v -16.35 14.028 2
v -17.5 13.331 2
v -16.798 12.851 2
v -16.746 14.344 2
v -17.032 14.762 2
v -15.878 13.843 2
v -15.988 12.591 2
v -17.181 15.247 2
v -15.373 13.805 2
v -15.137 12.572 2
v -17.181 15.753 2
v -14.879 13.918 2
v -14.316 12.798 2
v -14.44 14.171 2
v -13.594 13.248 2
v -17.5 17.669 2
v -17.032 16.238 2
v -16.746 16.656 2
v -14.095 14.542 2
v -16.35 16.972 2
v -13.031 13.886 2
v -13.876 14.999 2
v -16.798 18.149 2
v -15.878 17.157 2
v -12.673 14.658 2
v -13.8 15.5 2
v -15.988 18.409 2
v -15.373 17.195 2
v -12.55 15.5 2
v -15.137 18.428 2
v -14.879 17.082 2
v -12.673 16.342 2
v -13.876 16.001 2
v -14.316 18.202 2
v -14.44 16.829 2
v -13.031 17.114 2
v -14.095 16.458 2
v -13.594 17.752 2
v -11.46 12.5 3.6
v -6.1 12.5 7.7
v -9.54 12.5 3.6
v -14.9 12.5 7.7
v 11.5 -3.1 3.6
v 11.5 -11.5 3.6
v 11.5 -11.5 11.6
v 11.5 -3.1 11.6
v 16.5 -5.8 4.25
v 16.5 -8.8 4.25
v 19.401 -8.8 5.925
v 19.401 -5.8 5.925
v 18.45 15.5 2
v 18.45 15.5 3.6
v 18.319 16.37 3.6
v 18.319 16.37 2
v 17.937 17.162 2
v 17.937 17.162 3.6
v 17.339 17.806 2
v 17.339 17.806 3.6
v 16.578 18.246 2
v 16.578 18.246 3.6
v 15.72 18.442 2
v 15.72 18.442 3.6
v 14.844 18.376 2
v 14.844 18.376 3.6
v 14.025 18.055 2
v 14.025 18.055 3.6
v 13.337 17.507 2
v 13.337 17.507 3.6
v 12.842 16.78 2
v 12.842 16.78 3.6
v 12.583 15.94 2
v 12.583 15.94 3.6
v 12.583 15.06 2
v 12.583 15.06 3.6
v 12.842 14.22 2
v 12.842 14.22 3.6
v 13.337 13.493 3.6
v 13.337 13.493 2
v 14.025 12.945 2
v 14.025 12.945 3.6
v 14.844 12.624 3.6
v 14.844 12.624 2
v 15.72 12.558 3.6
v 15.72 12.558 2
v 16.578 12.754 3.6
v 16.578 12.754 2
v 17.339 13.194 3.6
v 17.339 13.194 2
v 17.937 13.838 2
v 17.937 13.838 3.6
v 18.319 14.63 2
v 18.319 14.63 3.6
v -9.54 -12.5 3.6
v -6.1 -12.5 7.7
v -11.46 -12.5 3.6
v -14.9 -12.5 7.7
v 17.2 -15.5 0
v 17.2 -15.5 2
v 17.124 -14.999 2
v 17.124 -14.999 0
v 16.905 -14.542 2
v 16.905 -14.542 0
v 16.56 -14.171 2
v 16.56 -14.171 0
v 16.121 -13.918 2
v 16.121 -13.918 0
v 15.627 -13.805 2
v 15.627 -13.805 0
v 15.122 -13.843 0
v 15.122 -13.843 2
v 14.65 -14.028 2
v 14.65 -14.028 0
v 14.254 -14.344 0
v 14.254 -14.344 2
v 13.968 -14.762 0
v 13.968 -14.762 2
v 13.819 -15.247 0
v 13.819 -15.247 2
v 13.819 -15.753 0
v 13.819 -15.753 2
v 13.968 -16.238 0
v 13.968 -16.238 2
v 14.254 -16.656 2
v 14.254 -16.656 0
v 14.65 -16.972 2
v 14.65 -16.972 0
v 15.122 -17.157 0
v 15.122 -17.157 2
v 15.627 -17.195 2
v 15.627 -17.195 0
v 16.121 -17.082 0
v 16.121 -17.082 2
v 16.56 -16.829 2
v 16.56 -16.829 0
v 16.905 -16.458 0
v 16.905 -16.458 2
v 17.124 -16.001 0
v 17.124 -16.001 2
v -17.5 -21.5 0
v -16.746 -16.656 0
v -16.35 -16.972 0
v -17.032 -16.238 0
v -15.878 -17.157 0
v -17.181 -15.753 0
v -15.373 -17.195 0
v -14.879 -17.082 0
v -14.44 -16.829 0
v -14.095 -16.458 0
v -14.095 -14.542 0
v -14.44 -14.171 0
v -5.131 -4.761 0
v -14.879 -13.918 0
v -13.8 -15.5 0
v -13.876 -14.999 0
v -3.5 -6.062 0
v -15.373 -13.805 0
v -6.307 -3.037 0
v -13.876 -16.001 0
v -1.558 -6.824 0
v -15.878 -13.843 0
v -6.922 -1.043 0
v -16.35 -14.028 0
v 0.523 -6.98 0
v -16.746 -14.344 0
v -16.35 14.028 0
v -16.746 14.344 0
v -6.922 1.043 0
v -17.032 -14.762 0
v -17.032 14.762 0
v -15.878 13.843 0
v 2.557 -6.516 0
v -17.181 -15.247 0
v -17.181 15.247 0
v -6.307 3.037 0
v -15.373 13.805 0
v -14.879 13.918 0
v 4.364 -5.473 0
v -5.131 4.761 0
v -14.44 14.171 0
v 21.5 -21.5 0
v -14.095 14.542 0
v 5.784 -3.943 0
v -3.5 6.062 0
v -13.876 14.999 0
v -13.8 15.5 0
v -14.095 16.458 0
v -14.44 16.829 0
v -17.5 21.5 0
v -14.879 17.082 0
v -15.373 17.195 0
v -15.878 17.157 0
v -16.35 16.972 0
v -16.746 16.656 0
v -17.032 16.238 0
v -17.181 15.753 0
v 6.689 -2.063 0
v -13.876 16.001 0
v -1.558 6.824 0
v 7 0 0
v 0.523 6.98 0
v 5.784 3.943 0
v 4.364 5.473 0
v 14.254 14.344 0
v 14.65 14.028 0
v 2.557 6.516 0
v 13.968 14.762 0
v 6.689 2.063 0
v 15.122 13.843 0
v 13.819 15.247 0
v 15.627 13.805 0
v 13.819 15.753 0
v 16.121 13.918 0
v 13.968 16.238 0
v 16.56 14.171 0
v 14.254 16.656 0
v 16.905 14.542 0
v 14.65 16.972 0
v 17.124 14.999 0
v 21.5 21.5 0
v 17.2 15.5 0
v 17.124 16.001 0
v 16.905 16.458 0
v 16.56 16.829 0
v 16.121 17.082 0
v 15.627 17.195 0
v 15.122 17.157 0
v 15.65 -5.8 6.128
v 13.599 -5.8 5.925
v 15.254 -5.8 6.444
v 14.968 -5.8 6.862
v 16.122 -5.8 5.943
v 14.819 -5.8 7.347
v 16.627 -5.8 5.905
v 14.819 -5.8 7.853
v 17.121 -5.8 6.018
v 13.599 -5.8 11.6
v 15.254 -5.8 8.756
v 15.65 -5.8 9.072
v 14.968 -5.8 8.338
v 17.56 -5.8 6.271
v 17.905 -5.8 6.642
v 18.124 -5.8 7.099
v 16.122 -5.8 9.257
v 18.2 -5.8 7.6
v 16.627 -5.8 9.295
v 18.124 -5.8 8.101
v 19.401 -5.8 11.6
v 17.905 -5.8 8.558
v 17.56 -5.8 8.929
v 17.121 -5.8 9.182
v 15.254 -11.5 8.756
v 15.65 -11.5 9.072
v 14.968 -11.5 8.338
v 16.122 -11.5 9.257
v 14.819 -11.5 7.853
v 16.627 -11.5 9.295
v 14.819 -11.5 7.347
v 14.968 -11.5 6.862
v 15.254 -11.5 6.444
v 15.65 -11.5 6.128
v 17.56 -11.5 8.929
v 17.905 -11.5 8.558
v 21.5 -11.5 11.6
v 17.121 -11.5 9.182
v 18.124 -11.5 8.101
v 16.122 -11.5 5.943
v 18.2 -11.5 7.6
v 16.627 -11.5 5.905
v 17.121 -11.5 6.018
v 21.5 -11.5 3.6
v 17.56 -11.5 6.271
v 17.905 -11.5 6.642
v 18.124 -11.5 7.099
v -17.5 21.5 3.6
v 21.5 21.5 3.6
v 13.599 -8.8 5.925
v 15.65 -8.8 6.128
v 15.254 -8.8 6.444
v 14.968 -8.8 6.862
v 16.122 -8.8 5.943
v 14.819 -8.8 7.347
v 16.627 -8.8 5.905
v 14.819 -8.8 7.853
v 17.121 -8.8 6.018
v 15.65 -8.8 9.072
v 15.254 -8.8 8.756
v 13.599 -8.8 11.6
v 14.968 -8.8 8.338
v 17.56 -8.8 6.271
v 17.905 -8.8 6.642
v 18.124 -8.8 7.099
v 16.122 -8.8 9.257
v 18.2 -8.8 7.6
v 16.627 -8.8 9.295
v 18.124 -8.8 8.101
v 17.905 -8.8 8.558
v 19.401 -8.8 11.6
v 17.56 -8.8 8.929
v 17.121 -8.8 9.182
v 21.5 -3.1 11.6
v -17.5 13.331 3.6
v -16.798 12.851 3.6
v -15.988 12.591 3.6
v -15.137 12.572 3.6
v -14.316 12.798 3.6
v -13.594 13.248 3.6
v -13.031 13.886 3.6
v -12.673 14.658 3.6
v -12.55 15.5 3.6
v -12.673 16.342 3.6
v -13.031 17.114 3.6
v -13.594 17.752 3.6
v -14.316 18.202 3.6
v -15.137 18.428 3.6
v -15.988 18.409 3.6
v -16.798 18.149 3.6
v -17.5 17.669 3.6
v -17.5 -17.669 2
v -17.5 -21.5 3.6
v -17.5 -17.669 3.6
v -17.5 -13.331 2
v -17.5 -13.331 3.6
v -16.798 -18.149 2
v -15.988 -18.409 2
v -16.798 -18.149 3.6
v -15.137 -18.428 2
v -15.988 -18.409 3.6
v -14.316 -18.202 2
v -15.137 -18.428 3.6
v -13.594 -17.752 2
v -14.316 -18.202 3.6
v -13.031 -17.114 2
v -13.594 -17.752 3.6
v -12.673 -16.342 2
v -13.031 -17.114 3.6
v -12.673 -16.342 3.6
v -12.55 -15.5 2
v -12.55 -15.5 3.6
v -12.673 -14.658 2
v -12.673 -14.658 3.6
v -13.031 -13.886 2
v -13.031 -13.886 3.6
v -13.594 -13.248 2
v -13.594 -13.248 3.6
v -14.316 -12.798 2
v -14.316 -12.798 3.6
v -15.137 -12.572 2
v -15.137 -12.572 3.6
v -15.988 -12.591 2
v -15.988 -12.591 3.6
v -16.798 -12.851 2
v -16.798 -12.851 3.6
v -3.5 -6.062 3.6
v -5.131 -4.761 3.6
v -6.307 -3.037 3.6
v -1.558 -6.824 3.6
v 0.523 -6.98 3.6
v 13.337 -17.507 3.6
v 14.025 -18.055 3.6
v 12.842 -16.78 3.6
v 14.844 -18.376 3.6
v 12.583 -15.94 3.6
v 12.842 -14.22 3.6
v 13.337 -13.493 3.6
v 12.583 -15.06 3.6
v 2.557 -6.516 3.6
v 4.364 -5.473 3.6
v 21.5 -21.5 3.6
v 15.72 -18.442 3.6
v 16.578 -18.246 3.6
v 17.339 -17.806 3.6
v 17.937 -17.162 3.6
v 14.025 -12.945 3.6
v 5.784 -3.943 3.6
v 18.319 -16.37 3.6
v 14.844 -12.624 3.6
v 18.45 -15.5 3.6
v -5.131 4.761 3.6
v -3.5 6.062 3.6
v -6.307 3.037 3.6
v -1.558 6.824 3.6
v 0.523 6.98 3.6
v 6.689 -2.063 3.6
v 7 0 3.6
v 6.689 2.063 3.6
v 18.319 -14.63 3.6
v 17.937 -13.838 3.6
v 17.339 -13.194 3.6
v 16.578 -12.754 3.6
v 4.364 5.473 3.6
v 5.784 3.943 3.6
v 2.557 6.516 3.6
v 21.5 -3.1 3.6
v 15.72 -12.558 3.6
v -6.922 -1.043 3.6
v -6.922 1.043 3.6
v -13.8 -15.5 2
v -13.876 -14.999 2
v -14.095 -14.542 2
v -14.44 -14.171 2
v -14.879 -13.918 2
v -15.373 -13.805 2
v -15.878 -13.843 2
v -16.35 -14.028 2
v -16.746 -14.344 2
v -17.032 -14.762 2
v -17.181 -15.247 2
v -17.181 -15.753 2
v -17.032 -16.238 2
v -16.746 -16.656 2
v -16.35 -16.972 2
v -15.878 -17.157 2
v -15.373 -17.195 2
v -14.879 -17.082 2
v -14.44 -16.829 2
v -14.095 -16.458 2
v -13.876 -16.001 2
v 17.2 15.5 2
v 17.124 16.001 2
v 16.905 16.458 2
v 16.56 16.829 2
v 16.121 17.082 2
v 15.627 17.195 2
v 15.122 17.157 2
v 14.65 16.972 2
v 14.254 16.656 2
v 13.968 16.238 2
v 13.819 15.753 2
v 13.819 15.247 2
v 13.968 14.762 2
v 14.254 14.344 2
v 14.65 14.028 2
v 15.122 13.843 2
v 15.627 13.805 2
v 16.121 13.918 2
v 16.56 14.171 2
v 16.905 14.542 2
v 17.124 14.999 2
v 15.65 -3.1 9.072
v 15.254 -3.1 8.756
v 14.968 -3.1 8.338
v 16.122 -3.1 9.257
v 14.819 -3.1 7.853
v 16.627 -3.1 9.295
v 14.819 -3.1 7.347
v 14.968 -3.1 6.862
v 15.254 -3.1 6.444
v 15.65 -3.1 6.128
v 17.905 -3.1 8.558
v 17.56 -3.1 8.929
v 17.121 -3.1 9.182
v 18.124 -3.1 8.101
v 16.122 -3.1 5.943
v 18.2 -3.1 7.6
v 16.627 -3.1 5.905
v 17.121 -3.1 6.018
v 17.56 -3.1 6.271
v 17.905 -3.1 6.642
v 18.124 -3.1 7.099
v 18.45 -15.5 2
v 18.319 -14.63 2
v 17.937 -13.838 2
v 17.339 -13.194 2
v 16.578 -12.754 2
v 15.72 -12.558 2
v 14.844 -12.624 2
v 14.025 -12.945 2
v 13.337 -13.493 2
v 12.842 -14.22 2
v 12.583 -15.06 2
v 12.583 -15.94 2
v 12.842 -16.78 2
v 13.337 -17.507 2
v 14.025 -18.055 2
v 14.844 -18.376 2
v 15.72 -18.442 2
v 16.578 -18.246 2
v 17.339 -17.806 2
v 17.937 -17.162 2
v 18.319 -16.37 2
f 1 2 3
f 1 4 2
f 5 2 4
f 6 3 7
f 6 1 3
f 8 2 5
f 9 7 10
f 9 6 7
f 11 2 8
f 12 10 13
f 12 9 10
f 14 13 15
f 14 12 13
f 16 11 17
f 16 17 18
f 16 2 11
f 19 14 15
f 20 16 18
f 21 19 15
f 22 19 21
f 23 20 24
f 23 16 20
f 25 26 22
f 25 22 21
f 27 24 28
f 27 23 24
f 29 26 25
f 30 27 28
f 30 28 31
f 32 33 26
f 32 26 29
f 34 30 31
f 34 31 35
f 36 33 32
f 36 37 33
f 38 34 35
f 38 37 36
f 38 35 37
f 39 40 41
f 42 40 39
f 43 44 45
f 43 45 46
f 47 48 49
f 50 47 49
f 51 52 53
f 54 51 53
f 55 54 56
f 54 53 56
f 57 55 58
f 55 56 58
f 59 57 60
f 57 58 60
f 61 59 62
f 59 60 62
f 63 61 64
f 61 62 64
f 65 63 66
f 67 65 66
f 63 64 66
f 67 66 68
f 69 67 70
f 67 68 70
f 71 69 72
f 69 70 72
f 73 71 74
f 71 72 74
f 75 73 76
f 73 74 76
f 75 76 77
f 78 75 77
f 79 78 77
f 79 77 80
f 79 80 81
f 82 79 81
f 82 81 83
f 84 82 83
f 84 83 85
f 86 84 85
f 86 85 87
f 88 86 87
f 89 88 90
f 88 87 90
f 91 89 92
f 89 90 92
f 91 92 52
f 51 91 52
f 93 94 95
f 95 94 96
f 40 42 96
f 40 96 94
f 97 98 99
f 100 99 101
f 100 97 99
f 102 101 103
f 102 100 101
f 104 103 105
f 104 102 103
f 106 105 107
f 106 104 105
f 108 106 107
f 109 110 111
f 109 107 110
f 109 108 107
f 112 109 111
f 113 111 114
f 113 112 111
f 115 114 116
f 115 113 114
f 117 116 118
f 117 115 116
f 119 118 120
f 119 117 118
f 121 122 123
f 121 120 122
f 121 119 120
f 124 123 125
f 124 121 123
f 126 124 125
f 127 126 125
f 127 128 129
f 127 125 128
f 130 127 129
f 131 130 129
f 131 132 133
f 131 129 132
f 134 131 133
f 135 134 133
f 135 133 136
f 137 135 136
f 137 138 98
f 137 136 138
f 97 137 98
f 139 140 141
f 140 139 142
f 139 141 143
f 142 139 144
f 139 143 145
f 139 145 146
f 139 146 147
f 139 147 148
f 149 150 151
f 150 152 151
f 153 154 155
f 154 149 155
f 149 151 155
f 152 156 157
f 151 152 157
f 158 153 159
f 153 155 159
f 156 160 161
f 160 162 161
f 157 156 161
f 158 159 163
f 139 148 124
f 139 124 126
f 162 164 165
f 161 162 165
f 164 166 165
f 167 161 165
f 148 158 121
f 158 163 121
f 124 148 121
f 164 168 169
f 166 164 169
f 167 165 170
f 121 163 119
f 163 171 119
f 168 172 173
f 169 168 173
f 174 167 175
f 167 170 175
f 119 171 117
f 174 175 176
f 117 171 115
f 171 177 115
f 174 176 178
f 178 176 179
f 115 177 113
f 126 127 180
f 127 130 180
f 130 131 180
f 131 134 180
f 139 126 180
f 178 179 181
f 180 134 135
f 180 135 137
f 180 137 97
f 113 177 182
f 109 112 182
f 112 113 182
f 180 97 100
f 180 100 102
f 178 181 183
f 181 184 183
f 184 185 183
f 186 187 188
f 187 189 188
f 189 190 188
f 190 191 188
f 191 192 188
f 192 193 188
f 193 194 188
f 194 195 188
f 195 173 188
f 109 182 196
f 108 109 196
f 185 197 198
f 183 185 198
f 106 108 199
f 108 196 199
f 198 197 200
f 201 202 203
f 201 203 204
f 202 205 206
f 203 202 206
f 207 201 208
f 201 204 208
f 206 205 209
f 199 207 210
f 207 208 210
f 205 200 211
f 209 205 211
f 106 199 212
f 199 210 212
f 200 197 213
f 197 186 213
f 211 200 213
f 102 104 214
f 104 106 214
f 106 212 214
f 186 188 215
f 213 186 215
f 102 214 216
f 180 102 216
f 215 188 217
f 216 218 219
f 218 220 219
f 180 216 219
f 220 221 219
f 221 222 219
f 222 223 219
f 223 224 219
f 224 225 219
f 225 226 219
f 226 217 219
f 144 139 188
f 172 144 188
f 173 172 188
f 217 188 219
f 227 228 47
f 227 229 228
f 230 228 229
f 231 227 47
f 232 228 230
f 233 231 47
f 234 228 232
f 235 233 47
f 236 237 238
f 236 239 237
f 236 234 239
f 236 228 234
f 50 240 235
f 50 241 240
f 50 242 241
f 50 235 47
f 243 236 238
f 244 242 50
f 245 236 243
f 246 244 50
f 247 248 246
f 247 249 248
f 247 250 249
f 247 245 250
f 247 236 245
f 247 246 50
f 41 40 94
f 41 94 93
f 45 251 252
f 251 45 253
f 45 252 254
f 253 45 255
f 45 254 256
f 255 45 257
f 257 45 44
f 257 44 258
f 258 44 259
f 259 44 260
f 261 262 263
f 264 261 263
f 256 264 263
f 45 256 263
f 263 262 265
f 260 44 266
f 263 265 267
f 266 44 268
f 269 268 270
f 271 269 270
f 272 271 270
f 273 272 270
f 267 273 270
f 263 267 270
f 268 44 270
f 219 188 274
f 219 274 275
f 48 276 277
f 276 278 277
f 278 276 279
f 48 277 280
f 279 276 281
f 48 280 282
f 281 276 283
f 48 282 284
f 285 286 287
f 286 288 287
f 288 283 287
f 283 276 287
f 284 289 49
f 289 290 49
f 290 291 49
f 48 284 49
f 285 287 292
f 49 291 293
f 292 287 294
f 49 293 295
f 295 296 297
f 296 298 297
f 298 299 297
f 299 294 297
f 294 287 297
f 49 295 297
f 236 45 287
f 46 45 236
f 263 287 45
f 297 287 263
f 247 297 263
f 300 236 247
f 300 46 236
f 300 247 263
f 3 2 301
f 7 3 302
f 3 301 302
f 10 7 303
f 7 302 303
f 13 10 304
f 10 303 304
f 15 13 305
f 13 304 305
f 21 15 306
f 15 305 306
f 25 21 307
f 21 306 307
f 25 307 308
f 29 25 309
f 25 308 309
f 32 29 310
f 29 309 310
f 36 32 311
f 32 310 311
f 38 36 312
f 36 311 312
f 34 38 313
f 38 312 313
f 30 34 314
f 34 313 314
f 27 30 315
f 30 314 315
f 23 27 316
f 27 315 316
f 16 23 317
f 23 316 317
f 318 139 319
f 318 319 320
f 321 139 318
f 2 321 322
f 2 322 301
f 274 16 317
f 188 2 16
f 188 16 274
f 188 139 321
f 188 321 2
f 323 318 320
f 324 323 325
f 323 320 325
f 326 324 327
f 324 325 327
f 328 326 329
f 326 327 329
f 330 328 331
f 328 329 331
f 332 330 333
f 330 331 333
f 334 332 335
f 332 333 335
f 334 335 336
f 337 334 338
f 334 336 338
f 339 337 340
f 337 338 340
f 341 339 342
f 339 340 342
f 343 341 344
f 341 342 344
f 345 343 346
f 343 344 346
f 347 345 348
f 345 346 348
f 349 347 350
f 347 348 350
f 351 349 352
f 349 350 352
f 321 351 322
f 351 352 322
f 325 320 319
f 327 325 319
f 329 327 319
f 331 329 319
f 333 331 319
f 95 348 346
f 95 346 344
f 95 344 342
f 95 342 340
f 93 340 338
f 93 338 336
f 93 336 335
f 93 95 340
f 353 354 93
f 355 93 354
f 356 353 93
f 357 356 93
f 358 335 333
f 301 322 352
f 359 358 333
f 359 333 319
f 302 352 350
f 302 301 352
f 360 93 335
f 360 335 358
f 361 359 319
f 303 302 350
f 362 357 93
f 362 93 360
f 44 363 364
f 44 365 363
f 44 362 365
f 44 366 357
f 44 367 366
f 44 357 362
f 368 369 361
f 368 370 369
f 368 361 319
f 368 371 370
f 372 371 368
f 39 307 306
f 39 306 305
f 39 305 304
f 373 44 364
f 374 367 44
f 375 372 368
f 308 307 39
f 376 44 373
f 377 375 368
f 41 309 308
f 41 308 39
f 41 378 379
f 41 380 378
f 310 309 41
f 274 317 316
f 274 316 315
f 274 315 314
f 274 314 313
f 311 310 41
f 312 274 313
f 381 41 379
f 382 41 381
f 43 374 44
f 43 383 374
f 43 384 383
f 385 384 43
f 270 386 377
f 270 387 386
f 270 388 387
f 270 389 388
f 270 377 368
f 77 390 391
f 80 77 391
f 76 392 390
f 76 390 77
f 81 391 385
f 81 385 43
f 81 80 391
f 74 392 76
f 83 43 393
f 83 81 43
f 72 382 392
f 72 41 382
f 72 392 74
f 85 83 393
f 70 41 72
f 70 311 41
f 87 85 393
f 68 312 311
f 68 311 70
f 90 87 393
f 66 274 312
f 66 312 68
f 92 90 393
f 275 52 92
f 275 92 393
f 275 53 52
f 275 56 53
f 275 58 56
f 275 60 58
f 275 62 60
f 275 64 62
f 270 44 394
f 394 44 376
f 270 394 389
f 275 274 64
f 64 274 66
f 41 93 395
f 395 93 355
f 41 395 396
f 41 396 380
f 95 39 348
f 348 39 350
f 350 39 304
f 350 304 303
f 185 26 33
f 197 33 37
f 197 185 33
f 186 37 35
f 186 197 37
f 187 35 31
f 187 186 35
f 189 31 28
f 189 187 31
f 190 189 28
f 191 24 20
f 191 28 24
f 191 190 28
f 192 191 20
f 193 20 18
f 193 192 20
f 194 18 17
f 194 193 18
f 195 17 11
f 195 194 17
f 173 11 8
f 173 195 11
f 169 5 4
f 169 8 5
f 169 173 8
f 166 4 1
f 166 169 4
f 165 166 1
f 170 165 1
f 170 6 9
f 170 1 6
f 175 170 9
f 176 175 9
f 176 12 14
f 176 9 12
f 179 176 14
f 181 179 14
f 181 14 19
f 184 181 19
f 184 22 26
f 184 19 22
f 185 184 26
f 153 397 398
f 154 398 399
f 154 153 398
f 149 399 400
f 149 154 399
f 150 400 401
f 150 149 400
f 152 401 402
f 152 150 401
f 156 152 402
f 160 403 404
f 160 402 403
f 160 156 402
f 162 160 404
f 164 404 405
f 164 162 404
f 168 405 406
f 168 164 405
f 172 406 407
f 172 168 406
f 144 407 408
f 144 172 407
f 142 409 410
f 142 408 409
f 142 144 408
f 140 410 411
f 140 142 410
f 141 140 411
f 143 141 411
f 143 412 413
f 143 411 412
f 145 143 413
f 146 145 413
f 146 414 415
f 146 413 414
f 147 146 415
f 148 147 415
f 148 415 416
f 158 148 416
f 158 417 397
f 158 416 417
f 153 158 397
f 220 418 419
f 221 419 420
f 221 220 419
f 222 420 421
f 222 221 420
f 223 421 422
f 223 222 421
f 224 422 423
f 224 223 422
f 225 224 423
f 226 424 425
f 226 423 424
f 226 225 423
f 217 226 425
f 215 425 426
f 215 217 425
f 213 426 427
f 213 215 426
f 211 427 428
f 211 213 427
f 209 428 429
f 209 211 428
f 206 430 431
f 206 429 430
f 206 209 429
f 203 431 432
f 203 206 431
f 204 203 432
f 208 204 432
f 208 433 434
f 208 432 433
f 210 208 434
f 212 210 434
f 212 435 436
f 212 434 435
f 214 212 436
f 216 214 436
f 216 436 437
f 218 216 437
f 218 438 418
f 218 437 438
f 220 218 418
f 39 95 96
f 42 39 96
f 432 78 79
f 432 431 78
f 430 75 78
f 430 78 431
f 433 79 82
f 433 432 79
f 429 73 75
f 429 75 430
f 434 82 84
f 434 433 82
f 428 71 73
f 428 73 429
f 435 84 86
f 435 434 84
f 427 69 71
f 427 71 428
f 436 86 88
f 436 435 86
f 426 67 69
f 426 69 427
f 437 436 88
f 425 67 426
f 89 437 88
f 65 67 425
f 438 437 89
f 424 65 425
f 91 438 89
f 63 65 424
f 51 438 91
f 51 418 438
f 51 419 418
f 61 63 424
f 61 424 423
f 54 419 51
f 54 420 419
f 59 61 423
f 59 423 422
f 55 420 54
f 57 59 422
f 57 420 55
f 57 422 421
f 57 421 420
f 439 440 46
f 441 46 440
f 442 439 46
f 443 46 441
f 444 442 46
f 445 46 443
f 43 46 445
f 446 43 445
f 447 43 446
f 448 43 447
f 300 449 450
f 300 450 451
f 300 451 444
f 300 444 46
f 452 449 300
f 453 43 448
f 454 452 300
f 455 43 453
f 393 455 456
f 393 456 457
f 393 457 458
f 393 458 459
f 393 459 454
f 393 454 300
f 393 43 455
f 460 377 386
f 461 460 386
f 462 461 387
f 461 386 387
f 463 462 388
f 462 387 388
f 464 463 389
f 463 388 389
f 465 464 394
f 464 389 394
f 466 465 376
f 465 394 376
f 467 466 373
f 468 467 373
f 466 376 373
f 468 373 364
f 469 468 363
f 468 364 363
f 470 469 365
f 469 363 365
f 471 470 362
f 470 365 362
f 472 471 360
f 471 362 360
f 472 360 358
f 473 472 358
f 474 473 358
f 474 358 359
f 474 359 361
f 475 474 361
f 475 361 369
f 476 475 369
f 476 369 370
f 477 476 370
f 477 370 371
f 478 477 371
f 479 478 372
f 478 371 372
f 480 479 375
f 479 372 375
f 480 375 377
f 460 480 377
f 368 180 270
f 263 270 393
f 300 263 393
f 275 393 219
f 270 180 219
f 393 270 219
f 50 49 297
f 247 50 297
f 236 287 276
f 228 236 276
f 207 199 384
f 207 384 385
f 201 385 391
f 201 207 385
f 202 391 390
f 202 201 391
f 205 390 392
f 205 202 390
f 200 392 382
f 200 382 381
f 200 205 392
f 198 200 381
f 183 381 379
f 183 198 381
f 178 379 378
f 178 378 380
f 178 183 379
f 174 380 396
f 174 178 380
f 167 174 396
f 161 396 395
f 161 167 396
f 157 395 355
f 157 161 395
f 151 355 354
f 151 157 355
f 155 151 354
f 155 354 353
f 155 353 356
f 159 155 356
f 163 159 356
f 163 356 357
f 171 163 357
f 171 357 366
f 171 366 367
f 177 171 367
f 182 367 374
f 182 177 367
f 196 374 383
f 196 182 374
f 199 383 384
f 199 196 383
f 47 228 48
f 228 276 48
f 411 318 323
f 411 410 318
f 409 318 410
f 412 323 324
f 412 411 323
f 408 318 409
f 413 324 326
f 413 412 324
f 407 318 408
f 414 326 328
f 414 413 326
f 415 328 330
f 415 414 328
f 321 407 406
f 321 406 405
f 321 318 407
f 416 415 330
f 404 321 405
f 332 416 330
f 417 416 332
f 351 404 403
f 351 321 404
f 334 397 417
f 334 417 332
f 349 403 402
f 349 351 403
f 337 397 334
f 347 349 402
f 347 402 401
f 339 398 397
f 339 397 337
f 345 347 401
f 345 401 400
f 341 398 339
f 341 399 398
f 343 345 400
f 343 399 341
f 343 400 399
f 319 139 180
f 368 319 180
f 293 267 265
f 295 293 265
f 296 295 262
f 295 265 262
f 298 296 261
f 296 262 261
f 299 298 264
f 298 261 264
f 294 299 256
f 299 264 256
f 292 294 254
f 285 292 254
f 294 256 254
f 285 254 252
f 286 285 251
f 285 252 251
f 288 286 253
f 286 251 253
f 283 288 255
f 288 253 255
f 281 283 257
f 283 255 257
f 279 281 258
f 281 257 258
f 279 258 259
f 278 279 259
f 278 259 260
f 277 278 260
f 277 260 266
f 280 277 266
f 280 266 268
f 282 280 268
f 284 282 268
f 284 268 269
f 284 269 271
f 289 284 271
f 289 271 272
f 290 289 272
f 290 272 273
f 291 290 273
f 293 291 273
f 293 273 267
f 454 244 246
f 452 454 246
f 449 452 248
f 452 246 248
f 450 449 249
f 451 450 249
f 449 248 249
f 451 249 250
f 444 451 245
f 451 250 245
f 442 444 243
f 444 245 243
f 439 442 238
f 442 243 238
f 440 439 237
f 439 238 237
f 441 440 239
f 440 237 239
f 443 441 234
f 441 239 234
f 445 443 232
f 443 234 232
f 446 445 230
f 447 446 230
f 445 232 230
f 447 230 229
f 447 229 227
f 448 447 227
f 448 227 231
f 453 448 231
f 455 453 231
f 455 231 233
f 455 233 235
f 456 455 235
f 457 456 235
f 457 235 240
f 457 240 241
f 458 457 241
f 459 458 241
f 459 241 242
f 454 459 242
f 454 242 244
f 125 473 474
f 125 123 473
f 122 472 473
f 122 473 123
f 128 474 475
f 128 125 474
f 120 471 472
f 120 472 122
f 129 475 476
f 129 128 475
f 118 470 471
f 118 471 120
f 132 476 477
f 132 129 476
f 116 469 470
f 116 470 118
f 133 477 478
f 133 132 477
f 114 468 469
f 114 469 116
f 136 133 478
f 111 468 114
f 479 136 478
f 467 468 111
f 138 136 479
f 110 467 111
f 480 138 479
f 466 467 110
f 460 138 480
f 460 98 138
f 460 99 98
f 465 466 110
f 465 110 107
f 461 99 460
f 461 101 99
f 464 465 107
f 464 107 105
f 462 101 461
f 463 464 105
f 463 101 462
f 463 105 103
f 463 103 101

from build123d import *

# Parameters (mm, degrees)
SKETCH_W        = 39
SKETCH_H        = 43
SKETCH_R        = 7
SKETCH_R_2      = 1.7
PAD_DEPTH       = 3.6
SKETCH001_R     = 2.95
POCKET_DEPTH    = 1.6
SKETCH002_W     = 10
SKETCH002_H     = 8.4
PAD001_DEPTH    = 8
SKETCH003_R     = 1.7
POCKET001_DEPTH = 33.001
POCKET002_DEPTH = 1.5
PAD002_DEPTH    = 12.5


with BuildPart() as part:
    # Sketch → Pad (new body)
    with BuildSketch(Plane.XY):
        with Locations((2, 0)):
            Rectangle(SKETCH_W, SKETCH_H)
        Circle(SKETCH_R, mode=Mode.SUBTRACT)
        with Locations((-15.5, 15.5)):
            Circle(SKETCH_R_2, mode=Mode.SUBTRACT)
        with Locations((15.5, 15.5)):
            Circle(SKETCH_R_2, mode=Mode.SUBTRACT)
        with Locations((15.5, -15.5)):
            Circle(SKETCH_R_2, mode=Mode.SUBTRACT)
        with Locations((-15.5, -15.5)):
            Circle(SKETCH_R_2, mode=Mode.SUBTRACT)
    extrude(amount=PAD_DEPTH)

    # Sketch001 (on Face11 of Pad) → Pocket (cut)
    with BuildSketch(Plane.XY.offset(3.6)):
        with Locations((-15.5, -15.5)):
            Circle(SKETCH001_R)
        with Locations((15.5, -15.5)):
            Circle(SKETCH001_R)
        with Locations((15.5, 15.5)):
            Circle(SKETCH001_R)
        with Locations((-15.5, 15.5)):
            Circle(SKETCH001_R)
    extrude(amount=-POCKET_DEPTH, mode=Mode.SUBTRACT)

    # Sketch002 (on Face5 of Pocket) → Pad001 (join)
    with BuildSketch(Plane.XY.offset(3.6)):
        with Locations((16.5, -7.3)):
            Rectangle(SKETCH002_W, SKETCH002_H)
    extrude(amount=PAD001_DEPTH)

    # Sketch003 (on Face15 of Pad001) → Pocket001 (cut, through all)
    with BuildSketch(Plane.XZ.offset(11.5)):
        with Locations((16.5, 7.6)):
            Circle(SKETCH003_R)
    extrude(amount=-POCKET001_DEPTH, mode=Mode.SUBTRACT)

    # Sketch004 (on DatumPlane) → Pocket002 (cut, symmetric)
    with BuildSketch(Plane.XZ.offset(7.3)):
        Polygon((13.598815, 5.925), (16.5, 4.25), (19.401185, 5.925), (19.401185, 15.925), (13.598815, 15.925), align=None)
    extrude(amount=POCKET002_DEPTH, both=True, mode=Mode.SUBTRACT)

    # Sketch005 → Pad002 (join, symmetric)
    with BuildSketch(Plane.XZ):
        Polygon((-14.9, 7.7), (-6.1, 7.7), (-10.5, 2.456284), align=None)
    extrude(amount=PAD002_DEPTH, both=True)


solid = part.part
